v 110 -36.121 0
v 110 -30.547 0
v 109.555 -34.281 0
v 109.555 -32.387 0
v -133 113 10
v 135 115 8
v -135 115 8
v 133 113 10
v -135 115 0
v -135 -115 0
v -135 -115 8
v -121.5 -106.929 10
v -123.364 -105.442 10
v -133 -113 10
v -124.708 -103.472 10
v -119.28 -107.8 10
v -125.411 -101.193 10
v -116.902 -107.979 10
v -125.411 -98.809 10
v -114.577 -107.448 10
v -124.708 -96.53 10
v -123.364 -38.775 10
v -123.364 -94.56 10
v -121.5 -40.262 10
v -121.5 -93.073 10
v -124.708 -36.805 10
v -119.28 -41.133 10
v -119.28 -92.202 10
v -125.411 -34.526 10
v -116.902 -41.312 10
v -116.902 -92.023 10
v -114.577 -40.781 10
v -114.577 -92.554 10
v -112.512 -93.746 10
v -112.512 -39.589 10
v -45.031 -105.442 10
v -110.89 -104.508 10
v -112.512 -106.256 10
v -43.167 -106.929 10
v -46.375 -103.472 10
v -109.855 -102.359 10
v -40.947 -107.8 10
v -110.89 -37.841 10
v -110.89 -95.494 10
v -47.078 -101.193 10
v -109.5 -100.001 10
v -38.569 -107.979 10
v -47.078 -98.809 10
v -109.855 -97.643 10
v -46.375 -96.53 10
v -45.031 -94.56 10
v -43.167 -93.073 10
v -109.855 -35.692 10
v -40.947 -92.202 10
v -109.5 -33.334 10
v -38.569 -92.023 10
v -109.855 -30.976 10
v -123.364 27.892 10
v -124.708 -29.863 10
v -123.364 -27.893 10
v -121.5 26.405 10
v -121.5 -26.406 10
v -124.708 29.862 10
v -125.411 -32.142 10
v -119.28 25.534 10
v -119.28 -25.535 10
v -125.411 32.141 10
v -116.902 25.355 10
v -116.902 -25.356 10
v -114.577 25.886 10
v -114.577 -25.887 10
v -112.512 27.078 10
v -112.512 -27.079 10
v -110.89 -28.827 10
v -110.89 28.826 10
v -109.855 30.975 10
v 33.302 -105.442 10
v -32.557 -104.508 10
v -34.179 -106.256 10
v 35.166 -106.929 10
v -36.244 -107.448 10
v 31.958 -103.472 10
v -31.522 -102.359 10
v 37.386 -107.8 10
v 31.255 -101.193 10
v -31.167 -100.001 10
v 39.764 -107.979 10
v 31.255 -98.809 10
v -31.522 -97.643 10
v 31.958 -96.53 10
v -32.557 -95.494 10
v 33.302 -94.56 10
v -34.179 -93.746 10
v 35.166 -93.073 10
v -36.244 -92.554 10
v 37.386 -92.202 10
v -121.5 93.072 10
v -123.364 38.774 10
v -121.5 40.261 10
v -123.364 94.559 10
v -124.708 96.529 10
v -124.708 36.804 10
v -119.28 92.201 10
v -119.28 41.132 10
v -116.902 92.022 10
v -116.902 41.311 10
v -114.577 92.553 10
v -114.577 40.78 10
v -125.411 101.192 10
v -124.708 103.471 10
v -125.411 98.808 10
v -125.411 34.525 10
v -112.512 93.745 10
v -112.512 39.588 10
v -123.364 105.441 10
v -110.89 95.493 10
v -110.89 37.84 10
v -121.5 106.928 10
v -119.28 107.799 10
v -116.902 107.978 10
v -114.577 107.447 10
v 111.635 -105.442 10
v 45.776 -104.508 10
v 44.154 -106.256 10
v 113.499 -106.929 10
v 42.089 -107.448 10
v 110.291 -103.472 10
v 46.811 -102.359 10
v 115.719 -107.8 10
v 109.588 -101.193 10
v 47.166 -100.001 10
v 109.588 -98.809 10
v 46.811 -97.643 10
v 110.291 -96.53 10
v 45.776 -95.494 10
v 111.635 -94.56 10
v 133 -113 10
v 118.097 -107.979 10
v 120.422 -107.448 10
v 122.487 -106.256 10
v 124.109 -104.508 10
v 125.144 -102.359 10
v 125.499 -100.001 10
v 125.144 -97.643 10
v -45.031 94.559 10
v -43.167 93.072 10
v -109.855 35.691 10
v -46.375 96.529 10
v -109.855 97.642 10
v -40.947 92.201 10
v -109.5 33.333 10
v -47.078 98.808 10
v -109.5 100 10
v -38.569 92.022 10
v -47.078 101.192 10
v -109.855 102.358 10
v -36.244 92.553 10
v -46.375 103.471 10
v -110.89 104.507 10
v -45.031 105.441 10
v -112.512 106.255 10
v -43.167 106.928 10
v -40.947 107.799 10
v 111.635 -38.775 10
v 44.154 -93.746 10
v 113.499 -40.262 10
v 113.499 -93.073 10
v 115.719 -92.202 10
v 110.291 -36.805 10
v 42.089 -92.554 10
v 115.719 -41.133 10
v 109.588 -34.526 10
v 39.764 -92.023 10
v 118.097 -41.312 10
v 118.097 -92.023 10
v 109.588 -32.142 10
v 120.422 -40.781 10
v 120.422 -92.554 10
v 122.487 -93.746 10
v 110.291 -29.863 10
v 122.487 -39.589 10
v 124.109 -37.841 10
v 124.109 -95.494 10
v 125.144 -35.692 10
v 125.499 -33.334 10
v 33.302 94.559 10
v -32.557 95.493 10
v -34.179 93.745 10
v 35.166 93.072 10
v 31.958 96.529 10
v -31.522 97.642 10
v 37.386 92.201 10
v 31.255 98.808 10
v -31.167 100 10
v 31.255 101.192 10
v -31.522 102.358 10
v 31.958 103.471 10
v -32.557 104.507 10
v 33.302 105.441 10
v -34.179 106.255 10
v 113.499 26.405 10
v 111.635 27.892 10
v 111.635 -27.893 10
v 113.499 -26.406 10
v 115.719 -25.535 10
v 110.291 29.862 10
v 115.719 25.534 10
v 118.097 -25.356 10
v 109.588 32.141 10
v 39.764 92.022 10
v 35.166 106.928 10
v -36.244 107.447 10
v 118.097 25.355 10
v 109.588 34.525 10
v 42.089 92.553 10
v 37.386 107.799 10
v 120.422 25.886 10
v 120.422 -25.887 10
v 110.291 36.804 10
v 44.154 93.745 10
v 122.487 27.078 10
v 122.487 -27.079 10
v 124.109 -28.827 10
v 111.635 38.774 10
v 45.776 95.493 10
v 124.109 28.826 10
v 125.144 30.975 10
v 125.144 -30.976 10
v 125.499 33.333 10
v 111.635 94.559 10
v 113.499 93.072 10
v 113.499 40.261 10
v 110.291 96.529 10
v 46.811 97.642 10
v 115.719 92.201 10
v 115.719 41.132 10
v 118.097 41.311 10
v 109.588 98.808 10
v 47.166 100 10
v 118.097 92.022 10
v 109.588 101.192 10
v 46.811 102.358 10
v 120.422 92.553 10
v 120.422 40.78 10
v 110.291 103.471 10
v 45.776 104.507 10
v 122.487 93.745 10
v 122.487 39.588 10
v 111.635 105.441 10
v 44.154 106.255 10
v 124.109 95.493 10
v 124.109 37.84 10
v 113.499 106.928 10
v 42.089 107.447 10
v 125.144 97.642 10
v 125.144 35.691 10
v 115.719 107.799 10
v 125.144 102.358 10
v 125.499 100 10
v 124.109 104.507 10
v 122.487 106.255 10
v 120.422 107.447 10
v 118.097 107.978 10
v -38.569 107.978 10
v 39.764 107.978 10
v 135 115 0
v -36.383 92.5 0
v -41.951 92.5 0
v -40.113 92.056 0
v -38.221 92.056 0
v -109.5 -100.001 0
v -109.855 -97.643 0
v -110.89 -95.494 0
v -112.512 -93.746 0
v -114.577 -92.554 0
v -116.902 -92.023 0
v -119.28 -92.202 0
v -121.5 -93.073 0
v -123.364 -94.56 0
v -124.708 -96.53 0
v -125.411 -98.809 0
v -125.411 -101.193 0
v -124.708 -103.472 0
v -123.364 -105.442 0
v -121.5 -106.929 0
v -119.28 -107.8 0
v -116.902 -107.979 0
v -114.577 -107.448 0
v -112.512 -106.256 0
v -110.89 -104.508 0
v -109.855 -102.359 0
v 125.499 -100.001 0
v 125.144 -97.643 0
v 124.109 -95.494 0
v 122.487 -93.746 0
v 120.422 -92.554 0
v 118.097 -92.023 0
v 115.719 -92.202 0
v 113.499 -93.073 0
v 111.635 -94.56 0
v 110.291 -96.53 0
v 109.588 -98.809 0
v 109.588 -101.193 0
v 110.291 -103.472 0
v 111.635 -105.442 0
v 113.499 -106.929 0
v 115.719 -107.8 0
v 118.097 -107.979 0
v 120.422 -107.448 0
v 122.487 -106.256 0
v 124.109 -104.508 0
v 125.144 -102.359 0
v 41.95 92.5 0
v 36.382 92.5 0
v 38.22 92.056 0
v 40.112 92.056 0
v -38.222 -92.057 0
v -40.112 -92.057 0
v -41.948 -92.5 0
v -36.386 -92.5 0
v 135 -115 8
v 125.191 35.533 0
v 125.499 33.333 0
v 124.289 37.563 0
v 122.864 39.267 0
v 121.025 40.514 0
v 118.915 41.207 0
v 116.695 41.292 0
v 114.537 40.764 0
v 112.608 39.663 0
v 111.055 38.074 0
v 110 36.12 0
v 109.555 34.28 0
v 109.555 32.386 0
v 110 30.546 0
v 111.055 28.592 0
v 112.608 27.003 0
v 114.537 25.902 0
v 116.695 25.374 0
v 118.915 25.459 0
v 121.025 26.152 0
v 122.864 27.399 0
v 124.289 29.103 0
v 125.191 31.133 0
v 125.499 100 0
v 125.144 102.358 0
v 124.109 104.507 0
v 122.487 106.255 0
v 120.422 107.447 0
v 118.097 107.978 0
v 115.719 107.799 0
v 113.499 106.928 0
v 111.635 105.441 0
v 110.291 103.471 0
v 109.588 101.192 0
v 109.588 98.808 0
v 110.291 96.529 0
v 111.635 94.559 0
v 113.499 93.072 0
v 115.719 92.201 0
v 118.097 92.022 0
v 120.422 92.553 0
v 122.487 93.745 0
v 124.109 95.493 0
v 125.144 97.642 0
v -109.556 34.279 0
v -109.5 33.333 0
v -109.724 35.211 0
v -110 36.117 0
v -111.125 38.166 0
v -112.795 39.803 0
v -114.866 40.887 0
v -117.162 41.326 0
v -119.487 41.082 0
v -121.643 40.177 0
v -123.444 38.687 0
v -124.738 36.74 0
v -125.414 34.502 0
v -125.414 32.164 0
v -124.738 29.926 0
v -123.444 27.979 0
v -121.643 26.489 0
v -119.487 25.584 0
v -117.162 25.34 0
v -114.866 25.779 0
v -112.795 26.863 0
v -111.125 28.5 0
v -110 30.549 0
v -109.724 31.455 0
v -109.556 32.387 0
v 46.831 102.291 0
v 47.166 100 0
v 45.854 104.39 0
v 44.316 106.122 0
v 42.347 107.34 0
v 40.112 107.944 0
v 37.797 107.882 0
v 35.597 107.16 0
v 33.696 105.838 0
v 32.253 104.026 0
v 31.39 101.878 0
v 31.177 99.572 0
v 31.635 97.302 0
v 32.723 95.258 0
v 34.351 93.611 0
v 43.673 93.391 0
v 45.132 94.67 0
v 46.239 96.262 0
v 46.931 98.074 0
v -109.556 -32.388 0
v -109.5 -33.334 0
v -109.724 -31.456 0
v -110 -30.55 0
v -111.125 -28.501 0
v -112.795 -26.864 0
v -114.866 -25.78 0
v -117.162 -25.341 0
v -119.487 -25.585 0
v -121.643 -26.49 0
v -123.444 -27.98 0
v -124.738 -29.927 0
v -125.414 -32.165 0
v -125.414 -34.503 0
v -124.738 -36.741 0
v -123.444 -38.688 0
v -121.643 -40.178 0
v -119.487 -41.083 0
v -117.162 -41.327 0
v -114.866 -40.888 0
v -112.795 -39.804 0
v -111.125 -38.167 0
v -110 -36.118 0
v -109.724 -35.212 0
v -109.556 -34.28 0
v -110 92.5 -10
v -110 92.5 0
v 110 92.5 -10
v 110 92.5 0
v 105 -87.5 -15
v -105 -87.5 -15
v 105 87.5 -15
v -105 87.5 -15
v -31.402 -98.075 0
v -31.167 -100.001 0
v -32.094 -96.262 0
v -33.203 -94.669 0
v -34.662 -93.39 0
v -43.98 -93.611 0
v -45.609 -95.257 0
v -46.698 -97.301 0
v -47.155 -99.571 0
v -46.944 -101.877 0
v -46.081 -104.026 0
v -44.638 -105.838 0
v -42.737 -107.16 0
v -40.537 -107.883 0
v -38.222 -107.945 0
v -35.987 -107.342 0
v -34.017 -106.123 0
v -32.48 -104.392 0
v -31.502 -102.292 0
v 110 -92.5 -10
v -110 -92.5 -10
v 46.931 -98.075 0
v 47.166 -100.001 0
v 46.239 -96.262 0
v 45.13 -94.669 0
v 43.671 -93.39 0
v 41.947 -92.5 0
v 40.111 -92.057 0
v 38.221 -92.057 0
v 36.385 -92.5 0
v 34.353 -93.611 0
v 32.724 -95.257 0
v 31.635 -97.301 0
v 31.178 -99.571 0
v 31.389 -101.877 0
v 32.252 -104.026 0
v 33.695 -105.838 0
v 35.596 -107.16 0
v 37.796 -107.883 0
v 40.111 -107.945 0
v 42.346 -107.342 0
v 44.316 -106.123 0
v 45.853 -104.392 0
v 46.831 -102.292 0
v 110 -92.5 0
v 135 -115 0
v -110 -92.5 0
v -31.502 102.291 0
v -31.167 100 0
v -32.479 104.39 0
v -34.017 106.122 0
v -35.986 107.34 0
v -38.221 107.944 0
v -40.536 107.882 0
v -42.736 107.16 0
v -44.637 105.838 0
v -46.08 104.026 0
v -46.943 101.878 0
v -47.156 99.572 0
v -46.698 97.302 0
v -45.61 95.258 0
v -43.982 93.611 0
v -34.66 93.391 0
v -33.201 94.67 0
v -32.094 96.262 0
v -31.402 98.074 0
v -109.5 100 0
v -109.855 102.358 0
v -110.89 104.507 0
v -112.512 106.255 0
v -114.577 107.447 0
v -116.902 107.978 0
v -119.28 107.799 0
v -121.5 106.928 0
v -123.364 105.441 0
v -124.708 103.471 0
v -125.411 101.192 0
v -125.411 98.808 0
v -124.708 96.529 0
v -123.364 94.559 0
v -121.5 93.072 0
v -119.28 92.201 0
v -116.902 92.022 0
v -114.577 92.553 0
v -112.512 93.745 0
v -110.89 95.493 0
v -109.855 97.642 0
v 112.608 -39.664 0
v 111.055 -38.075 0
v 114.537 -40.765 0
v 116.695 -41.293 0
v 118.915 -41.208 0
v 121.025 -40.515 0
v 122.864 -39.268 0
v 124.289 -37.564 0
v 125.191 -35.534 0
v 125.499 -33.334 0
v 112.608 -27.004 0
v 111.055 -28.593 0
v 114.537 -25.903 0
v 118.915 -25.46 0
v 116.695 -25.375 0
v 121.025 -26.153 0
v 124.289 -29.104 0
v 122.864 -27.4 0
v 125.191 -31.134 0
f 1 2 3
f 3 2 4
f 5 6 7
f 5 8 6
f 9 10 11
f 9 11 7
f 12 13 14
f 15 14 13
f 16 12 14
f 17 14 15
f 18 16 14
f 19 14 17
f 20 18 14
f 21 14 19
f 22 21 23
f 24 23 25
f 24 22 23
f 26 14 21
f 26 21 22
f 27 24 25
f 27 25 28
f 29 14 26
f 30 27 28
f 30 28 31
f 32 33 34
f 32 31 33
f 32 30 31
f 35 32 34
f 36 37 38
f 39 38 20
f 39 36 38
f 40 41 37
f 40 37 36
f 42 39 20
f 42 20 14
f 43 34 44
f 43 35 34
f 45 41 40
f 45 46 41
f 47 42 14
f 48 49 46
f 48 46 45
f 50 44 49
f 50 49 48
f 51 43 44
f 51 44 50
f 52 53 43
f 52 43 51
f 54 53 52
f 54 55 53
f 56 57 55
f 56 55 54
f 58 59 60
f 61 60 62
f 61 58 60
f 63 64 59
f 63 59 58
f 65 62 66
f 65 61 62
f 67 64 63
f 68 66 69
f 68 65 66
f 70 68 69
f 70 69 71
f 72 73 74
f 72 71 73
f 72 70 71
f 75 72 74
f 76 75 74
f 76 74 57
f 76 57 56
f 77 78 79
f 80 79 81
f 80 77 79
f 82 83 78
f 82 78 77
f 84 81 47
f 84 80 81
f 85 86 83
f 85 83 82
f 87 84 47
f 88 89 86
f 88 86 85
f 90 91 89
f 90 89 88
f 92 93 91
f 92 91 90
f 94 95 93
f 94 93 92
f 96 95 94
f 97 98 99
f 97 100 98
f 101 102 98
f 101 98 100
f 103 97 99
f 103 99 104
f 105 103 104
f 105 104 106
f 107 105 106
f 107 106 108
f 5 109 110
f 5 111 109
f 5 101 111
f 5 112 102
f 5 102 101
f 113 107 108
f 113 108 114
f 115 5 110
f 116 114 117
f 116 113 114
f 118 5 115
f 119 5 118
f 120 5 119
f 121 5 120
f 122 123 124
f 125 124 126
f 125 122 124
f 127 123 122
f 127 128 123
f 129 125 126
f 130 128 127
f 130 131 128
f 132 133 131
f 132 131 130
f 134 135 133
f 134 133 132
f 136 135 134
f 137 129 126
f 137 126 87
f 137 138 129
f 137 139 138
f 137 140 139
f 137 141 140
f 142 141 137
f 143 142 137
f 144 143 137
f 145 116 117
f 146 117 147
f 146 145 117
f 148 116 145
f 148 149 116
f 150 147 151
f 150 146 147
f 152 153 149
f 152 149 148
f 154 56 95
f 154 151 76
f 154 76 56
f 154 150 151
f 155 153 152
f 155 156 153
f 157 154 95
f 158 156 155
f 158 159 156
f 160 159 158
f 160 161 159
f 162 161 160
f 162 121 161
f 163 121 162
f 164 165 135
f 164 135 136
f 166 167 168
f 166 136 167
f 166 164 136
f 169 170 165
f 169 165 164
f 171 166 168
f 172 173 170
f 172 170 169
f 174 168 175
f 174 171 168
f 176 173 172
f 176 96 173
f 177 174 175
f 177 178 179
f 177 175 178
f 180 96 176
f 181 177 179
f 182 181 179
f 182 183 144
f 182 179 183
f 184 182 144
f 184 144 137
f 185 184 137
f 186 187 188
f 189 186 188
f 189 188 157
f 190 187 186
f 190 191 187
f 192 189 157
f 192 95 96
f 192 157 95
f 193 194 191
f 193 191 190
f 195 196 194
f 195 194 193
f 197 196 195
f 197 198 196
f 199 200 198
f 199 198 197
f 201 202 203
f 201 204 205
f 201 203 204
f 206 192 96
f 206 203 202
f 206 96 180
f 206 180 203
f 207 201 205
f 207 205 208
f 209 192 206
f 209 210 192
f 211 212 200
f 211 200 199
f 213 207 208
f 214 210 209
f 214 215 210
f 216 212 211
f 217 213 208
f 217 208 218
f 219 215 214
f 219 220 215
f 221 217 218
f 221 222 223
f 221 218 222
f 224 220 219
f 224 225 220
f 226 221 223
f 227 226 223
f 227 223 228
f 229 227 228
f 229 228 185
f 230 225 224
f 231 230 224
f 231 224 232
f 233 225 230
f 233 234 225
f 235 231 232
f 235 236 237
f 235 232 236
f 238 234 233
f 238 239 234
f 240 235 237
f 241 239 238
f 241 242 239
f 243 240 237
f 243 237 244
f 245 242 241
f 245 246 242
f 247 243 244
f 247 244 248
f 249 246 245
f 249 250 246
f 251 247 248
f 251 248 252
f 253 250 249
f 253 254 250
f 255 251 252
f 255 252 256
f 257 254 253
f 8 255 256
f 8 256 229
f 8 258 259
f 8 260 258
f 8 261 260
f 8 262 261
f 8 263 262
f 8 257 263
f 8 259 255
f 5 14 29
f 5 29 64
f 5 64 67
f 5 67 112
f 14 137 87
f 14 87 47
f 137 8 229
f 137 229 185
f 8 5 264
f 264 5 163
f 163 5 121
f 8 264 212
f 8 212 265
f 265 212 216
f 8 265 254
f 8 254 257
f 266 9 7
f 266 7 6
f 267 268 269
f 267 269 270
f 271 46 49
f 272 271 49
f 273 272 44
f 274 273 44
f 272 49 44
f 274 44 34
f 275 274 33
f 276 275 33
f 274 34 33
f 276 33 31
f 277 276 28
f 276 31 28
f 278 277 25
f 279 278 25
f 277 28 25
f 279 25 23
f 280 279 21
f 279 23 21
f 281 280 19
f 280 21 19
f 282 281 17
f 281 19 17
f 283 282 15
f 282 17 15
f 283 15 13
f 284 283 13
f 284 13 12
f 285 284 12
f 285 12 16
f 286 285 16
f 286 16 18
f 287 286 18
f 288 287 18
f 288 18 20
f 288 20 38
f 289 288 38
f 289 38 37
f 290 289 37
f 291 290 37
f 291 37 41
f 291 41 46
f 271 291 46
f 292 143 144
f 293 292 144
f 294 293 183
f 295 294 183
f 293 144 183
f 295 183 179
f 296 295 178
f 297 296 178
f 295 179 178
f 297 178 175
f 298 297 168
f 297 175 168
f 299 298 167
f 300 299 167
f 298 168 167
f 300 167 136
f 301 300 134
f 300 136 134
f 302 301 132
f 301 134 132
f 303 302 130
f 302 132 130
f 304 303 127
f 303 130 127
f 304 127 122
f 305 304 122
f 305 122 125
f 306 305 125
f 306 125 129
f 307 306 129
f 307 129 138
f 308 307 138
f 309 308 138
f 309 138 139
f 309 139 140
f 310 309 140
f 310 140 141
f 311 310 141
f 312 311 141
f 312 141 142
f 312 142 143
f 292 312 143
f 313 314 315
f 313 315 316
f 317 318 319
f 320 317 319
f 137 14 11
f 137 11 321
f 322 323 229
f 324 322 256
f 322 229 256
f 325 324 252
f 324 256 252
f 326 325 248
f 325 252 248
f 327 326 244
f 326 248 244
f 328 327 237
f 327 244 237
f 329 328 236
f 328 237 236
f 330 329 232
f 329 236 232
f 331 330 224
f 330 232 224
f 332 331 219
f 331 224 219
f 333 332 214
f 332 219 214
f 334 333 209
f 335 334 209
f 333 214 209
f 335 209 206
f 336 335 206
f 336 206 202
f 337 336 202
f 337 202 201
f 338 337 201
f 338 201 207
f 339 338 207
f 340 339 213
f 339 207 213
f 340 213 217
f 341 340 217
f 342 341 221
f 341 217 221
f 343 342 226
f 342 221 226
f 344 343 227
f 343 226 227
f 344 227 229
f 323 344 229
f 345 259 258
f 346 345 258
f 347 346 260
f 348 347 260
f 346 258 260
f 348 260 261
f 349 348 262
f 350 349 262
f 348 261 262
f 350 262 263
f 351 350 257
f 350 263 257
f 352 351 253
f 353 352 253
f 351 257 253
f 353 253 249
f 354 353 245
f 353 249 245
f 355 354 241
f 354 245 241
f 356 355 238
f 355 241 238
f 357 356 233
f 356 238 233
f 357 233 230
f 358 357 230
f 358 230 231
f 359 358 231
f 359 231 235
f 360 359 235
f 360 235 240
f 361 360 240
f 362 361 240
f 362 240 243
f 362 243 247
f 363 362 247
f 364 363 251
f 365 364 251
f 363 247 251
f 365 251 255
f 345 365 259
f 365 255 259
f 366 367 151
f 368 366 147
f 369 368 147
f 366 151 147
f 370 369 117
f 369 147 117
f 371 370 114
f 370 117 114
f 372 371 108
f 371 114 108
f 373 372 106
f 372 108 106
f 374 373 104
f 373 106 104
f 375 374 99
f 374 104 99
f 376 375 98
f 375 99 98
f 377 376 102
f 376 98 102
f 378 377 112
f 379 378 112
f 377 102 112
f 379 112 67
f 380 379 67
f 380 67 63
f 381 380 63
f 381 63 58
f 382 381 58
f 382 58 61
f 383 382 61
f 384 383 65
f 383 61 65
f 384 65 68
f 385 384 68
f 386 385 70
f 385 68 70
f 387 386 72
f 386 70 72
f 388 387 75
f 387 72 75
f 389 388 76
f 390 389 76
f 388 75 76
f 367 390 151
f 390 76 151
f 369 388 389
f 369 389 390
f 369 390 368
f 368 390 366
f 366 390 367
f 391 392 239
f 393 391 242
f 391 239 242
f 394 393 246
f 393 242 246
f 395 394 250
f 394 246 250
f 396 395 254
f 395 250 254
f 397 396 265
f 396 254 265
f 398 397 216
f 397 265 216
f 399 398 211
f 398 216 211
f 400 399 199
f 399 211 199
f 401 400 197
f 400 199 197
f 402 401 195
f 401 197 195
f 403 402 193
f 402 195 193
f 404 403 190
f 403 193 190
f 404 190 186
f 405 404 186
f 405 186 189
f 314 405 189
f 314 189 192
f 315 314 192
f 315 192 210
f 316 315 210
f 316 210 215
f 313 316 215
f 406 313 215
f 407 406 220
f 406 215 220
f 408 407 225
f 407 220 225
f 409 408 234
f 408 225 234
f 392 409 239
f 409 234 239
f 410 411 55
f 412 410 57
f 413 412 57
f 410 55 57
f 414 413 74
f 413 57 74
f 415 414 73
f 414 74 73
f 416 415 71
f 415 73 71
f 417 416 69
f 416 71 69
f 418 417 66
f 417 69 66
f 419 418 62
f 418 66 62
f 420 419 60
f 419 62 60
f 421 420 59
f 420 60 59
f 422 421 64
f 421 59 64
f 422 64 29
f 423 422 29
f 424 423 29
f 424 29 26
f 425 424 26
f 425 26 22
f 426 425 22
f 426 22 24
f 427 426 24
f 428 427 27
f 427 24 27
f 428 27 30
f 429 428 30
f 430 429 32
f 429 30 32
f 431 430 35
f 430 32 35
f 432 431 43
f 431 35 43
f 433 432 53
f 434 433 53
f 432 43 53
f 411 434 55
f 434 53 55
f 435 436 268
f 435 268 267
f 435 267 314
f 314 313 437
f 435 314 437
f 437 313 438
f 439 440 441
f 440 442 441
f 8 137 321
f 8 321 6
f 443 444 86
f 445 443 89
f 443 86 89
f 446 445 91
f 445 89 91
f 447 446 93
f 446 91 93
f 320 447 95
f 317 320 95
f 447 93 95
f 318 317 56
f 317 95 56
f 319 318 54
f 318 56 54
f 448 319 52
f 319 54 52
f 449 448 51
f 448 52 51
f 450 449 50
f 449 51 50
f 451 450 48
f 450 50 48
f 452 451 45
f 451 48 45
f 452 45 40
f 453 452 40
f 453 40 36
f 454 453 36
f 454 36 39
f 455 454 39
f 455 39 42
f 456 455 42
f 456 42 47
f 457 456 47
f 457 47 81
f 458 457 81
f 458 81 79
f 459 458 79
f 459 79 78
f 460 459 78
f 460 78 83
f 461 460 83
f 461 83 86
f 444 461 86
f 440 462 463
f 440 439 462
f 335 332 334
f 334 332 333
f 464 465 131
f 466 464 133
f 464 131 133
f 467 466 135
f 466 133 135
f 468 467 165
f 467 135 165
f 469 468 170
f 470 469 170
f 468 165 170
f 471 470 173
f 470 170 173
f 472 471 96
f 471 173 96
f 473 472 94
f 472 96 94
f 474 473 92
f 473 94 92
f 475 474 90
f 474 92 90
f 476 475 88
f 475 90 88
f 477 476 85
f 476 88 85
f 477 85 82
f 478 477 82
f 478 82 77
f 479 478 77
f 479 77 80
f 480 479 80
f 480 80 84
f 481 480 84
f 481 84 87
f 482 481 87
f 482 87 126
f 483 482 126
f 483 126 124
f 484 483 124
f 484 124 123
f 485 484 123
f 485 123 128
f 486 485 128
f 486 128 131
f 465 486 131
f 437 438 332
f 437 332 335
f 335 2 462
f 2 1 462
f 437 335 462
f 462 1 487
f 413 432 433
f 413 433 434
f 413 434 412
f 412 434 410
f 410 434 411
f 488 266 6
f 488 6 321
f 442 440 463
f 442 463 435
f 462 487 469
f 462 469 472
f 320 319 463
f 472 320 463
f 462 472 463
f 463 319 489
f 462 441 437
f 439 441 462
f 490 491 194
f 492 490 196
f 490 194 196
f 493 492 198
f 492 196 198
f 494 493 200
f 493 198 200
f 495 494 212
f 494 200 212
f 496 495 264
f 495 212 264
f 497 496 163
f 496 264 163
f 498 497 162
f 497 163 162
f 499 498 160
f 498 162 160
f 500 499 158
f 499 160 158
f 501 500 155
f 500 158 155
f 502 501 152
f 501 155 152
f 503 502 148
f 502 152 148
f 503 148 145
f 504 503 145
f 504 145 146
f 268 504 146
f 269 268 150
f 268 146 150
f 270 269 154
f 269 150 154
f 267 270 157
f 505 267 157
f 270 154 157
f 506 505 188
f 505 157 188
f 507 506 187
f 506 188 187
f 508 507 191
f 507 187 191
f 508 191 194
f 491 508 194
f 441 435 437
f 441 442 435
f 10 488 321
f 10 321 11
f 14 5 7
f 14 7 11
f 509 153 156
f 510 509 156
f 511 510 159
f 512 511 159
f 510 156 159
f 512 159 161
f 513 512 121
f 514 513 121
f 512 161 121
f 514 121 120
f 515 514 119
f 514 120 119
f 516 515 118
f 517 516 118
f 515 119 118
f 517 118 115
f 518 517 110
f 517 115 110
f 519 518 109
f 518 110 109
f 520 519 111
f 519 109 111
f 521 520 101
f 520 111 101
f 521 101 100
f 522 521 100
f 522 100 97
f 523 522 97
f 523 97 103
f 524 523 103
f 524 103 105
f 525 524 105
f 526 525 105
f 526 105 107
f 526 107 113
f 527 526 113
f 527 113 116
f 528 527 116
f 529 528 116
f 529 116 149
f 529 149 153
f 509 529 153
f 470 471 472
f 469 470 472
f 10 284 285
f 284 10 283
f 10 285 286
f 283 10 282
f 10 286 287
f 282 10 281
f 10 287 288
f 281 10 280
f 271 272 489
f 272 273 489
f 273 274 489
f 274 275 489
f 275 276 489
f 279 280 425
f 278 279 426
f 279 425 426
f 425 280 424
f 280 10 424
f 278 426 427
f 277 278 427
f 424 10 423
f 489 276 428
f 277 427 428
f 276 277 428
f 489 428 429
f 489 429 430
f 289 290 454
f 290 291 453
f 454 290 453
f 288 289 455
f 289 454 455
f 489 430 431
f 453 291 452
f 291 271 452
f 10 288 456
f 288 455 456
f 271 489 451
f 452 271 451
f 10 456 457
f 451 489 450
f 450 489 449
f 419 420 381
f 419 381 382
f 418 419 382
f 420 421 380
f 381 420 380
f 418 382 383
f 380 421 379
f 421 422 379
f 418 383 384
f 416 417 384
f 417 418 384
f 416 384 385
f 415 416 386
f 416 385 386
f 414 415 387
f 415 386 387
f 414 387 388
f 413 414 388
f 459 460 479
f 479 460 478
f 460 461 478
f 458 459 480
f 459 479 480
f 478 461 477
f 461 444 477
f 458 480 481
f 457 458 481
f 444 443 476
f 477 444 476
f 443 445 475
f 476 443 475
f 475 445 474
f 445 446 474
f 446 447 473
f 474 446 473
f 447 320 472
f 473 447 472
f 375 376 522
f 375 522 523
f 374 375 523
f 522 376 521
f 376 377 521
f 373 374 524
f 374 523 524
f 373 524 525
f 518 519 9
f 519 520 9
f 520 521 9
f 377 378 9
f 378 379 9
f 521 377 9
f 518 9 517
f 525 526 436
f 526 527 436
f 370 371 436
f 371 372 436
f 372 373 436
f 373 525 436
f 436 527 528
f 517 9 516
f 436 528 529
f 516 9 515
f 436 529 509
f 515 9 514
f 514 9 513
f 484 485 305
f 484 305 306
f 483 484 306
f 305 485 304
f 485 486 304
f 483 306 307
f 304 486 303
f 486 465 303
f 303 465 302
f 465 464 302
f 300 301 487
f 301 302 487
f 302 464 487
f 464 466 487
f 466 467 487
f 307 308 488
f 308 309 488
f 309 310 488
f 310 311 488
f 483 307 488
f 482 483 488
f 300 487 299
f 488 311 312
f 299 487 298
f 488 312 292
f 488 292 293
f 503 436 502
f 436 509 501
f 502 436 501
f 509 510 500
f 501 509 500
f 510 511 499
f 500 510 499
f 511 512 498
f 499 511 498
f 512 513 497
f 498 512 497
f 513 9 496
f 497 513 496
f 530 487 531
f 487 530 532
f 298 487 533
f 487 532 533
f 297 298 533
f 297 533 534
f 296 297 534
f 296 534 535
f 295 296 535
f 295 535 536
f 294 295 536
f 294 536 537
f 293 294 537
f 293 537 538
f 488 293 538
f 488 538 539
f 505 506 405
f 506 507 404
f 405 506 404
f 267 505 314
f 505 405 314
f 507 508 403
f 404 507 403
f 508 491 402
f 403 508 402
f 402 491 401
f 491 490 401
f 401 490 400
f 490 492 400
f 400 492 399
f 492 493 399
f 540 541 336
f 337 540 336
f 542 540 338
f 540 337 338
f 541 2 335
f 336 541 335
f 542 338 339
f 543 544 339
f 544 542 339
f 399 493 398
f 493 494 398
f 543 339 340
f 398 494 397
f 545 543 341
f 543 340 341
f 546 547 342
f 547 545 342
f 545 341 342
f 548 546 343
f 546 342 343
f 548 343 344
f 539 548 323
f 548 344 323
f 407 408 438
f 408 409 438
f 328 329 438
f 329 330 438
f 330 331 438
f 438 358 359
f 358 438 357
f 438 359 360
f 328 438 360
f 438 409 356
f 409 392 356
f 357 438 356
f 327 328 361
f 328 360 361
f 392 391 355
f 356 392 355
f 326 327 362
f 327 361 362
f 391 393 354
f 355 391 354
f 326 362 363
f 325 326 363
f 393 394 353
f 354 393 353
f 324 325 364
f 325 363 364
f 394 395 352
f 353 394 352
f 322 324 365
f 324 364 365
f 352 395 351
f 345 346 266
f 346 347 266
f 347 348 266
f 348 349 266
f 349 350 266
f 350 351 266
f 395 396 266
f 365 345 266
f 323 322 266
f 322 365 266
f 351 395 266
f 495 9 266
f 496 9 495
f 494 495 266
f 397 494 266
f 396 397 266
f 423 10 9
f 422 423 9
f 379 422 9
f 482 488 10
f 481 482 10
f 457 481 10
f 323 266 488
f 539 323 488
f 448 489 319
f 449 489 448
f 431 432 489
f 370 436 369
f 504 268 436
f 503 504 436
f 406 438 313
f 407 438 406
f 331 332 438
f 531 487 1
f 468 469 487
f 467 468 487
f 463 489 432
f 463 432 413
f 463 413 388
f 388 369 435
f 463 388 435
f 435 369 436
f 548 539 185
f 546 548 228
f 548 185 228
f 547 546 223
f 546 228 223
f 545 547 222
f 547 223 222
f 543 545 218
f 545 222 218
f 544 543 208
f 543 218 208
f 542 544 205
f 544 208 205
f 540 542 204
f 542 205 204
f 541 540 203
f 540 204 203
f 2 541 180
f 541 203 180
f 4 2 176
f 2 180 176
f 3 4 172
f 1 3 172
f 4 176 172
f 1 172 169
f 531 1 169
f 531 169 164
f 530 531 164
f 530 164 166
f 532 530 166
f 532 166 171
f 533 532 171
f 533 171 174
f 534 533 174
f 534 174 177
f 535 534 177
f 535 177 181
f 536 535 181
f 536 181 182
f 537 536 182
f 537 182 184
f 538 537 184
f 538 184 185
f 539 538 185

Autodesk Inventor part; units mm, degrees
ref_plane "YZ Plane" through (0, 0, 0) normal (1, 0, 0) x (0, 1, 0)
ref_plane "XZ Plane" through (0, 0, 0) normal (0, 1, 0) x (-1, 0, 0)
ref_plane "XY Plane" through (0, 0, 0) normal (0, 0, 1) x (1, 0, 0)
sketch "Sketch1" plane through (0, 0, 0) normal (0, 0, 1) x (1, 0, 0)
  line L0 (-135, 115) -> (135, 115)
  line L1 (135, 115) -> (135, -115)
  line L2 (135, -115) -> (-135, -115)
  line L3 (-135, -115) -> (-135, 115)
  line L4 (-110, 92.5) -> (110, 92.5)
  line L5 (110, 92.5) -> (110, -92.5)
  line L6 (110, -92.5) -> (-110, -92.5)
  line L7 (-110, -92.5) -> (-110, 92.5)
  point P0 (0, 0)
  point P1 (0, 115)
  point P2 (0, 92.5)
  point P3 (-110, 0)
  point P4 (-135, 0)
  dimension "d0" = 270
  dimension "d1" = 230
  dimension "d2" = 220
  dimension "d3" = 185
extrude "Extrusion1" add sketch "Sketch1" against normal blind 15 contours L4 L5 L6 L7
extrude "Extrusion2" add sketch "Sketch1" along normal blind 10 contours L0 L1 L2 L3 | L4 L5 L6 L7
chamfer "Chamfer1" distance 5 angle 45 4 edges at (0, 92.5, -15) (110, 0, -15) (0, -92.5, -15) (-110, 0, -15)
sketch "Sketch2" plane through (0, 0, 10) normal (0, 0, 1) x (1, 0, 0)
  line L0 (125, -107.5) -> (125, 107.5)
  line L1 (-125, 107.5) -> (-125, -107.5)
  line L2 (125, 107.5) -> (-125, 107.5)
  line L3 (-125, -107.5) -> (125, -107.5)
  line L4 (0, 107.5) -> (0, -107.5)
  line L5 (-135, -115) -> (135, -115) projected
  line L6 (135, -115) -> (135, 115) projected
  line L7 (135, 115) -> (-135, 115) projected
  line L8 (-135, 115) -> (-135, -115) projected
  point P0 (0, 0)
  point P1 (-117.5, 100)
  point P2 (-39.1667, 100)
  point P3 (39.1667, 100)
  point P4 (117.5, 100)
  point P5 (-117.5, 33.3333)
  point P6 (-117.5, -33.3333)
  point P7 (-117.5, -100)
  point P8 (-200.4459, 0)
  point P9 (-39.1667, -100)
  point P10 (39.1667, -100)
  point P11 (117.5, -100)
  point P12 (117.5, 33.3333)
  point P13 (117.5, -33.3333)
  dimension "d19" = 250
  dimension "d22" = 7.5
  dimension "d23" = 7.5
  dimension "d24" = 78.3333
  dimension "d25" = 215
  dimension "d26" = 66.6667
hole "Hole1" at (117.5, -33.3333, 10) at (117.5, 33.3333, 10) at (117.5, -100, 10) at (39.1667, -100, 10) at (-39.1667, -100, 10) at (-117.5, -100, 10) at (-117.5, -33.3333, 10) at (-117.5, 33.3333, 10) at (117.5, 100, 10) at (39.1667, 100, 10) at (-39.1667, 100, 10) at (-117.5, 100, 10) direction (0, 0, -1) diameter 8.376 depth 27.3 tip angle 118 thread size "M10x1.5" class "6H" standard "ISO Metric profile"
chamfer "Chamfer2" distance 2 angle 45 4 edges at (0, 115, 10) (-135, 0, 10) (135, 0, 10) (0, -115, 10)
sketch "Sketch3" plane through (0, 0, 10) normal (0, 0, 1) x (1, 0, 0)
  circle A0 centre (-117.5, 100) radius 4.188 projected
  circle A1 centre (39.1667, 100) radius 4.188 projected
  circle A2 centre (-117.5, 33.3333) radius 4.188 projected
  circle A3 centre (-117.5, -100) radius 4.188 projected
  circle A4 centre (39.1667, -100) radius 4.188 projected
  circle A5 centre (117.5, 33.3333) radius 4.188 projected
  circle A6 centre (117.5, -33.3333) radius 4.188 projected
  circle A7 centre (117.5, -100) radius 4.188 projected
  circle A8 centre (-39.1667, -100) radius 4.188 projected
  circle A9 centre (-117.5, -33.3333) radius 4.188 projected
  circle A10 centre (117.5, 100) radius 4.188 projected
  circle A11 centre (-39.1667, 100) radius 4.188 projected
  line L0 (133, -113) -> (-133, -113) projected
  line L1 (133, 113) -> (133, -113) projected
  line L2 (-133, 113) -> (133, 113) projected
  line L3 (-133, -113) -> (-133, 113) projected
  circle A12 centre (-117.5, 100) radius 8
  circle A13 centre (-39.167, 100) radius 8
  circle A14 centre (39.166, 100) radius 8
  circle A15 centre (117.499, 100) radius 8
  circle A16 centre (-117.5, 33.333) radius 8
  circle A17 centre (-117.5, -33.334) radius 8
  circle A18 centre (-117.5, -100.001) radius 8
  circle A19 centre (-39.167, -100.001) radius 8
  circle A20 centre (39.166, -100.001) radius 8
  circle A21 centre (117.499, -100.001) radius 8
  circle A22 centre (117.499, 33.333) radius 8
  circle A23 centre (117.499, -33.334) radius 8
  point P0 (0, 0)
  dimension "d39" = 16
  dimension "d42" = 78.333
  dimension "d49" = 66.667
  dimension "d56" = 78.333
  dimension "d63" = 66.667
extrude "Extrusion3" cut sketch "Sketch3" against normal blind 10 contours A0 | A1 | A2 | A3 | A4 | A5 | A6 | A7 | A8 | A9 | A10 | A11 | A12 | A13 | A14 | A15 | A16 | A17 | A18 | A19 | A20 | A21 | A22 | A23
equation "\"d22\" = 0.5 * d20"
equation "\"d23\" = 0.5 * d21"
equation "\"d20\" = 15"
equation "\"d21\" = 15"
properties part number "Cover of base" material "Steel, Alloy"
